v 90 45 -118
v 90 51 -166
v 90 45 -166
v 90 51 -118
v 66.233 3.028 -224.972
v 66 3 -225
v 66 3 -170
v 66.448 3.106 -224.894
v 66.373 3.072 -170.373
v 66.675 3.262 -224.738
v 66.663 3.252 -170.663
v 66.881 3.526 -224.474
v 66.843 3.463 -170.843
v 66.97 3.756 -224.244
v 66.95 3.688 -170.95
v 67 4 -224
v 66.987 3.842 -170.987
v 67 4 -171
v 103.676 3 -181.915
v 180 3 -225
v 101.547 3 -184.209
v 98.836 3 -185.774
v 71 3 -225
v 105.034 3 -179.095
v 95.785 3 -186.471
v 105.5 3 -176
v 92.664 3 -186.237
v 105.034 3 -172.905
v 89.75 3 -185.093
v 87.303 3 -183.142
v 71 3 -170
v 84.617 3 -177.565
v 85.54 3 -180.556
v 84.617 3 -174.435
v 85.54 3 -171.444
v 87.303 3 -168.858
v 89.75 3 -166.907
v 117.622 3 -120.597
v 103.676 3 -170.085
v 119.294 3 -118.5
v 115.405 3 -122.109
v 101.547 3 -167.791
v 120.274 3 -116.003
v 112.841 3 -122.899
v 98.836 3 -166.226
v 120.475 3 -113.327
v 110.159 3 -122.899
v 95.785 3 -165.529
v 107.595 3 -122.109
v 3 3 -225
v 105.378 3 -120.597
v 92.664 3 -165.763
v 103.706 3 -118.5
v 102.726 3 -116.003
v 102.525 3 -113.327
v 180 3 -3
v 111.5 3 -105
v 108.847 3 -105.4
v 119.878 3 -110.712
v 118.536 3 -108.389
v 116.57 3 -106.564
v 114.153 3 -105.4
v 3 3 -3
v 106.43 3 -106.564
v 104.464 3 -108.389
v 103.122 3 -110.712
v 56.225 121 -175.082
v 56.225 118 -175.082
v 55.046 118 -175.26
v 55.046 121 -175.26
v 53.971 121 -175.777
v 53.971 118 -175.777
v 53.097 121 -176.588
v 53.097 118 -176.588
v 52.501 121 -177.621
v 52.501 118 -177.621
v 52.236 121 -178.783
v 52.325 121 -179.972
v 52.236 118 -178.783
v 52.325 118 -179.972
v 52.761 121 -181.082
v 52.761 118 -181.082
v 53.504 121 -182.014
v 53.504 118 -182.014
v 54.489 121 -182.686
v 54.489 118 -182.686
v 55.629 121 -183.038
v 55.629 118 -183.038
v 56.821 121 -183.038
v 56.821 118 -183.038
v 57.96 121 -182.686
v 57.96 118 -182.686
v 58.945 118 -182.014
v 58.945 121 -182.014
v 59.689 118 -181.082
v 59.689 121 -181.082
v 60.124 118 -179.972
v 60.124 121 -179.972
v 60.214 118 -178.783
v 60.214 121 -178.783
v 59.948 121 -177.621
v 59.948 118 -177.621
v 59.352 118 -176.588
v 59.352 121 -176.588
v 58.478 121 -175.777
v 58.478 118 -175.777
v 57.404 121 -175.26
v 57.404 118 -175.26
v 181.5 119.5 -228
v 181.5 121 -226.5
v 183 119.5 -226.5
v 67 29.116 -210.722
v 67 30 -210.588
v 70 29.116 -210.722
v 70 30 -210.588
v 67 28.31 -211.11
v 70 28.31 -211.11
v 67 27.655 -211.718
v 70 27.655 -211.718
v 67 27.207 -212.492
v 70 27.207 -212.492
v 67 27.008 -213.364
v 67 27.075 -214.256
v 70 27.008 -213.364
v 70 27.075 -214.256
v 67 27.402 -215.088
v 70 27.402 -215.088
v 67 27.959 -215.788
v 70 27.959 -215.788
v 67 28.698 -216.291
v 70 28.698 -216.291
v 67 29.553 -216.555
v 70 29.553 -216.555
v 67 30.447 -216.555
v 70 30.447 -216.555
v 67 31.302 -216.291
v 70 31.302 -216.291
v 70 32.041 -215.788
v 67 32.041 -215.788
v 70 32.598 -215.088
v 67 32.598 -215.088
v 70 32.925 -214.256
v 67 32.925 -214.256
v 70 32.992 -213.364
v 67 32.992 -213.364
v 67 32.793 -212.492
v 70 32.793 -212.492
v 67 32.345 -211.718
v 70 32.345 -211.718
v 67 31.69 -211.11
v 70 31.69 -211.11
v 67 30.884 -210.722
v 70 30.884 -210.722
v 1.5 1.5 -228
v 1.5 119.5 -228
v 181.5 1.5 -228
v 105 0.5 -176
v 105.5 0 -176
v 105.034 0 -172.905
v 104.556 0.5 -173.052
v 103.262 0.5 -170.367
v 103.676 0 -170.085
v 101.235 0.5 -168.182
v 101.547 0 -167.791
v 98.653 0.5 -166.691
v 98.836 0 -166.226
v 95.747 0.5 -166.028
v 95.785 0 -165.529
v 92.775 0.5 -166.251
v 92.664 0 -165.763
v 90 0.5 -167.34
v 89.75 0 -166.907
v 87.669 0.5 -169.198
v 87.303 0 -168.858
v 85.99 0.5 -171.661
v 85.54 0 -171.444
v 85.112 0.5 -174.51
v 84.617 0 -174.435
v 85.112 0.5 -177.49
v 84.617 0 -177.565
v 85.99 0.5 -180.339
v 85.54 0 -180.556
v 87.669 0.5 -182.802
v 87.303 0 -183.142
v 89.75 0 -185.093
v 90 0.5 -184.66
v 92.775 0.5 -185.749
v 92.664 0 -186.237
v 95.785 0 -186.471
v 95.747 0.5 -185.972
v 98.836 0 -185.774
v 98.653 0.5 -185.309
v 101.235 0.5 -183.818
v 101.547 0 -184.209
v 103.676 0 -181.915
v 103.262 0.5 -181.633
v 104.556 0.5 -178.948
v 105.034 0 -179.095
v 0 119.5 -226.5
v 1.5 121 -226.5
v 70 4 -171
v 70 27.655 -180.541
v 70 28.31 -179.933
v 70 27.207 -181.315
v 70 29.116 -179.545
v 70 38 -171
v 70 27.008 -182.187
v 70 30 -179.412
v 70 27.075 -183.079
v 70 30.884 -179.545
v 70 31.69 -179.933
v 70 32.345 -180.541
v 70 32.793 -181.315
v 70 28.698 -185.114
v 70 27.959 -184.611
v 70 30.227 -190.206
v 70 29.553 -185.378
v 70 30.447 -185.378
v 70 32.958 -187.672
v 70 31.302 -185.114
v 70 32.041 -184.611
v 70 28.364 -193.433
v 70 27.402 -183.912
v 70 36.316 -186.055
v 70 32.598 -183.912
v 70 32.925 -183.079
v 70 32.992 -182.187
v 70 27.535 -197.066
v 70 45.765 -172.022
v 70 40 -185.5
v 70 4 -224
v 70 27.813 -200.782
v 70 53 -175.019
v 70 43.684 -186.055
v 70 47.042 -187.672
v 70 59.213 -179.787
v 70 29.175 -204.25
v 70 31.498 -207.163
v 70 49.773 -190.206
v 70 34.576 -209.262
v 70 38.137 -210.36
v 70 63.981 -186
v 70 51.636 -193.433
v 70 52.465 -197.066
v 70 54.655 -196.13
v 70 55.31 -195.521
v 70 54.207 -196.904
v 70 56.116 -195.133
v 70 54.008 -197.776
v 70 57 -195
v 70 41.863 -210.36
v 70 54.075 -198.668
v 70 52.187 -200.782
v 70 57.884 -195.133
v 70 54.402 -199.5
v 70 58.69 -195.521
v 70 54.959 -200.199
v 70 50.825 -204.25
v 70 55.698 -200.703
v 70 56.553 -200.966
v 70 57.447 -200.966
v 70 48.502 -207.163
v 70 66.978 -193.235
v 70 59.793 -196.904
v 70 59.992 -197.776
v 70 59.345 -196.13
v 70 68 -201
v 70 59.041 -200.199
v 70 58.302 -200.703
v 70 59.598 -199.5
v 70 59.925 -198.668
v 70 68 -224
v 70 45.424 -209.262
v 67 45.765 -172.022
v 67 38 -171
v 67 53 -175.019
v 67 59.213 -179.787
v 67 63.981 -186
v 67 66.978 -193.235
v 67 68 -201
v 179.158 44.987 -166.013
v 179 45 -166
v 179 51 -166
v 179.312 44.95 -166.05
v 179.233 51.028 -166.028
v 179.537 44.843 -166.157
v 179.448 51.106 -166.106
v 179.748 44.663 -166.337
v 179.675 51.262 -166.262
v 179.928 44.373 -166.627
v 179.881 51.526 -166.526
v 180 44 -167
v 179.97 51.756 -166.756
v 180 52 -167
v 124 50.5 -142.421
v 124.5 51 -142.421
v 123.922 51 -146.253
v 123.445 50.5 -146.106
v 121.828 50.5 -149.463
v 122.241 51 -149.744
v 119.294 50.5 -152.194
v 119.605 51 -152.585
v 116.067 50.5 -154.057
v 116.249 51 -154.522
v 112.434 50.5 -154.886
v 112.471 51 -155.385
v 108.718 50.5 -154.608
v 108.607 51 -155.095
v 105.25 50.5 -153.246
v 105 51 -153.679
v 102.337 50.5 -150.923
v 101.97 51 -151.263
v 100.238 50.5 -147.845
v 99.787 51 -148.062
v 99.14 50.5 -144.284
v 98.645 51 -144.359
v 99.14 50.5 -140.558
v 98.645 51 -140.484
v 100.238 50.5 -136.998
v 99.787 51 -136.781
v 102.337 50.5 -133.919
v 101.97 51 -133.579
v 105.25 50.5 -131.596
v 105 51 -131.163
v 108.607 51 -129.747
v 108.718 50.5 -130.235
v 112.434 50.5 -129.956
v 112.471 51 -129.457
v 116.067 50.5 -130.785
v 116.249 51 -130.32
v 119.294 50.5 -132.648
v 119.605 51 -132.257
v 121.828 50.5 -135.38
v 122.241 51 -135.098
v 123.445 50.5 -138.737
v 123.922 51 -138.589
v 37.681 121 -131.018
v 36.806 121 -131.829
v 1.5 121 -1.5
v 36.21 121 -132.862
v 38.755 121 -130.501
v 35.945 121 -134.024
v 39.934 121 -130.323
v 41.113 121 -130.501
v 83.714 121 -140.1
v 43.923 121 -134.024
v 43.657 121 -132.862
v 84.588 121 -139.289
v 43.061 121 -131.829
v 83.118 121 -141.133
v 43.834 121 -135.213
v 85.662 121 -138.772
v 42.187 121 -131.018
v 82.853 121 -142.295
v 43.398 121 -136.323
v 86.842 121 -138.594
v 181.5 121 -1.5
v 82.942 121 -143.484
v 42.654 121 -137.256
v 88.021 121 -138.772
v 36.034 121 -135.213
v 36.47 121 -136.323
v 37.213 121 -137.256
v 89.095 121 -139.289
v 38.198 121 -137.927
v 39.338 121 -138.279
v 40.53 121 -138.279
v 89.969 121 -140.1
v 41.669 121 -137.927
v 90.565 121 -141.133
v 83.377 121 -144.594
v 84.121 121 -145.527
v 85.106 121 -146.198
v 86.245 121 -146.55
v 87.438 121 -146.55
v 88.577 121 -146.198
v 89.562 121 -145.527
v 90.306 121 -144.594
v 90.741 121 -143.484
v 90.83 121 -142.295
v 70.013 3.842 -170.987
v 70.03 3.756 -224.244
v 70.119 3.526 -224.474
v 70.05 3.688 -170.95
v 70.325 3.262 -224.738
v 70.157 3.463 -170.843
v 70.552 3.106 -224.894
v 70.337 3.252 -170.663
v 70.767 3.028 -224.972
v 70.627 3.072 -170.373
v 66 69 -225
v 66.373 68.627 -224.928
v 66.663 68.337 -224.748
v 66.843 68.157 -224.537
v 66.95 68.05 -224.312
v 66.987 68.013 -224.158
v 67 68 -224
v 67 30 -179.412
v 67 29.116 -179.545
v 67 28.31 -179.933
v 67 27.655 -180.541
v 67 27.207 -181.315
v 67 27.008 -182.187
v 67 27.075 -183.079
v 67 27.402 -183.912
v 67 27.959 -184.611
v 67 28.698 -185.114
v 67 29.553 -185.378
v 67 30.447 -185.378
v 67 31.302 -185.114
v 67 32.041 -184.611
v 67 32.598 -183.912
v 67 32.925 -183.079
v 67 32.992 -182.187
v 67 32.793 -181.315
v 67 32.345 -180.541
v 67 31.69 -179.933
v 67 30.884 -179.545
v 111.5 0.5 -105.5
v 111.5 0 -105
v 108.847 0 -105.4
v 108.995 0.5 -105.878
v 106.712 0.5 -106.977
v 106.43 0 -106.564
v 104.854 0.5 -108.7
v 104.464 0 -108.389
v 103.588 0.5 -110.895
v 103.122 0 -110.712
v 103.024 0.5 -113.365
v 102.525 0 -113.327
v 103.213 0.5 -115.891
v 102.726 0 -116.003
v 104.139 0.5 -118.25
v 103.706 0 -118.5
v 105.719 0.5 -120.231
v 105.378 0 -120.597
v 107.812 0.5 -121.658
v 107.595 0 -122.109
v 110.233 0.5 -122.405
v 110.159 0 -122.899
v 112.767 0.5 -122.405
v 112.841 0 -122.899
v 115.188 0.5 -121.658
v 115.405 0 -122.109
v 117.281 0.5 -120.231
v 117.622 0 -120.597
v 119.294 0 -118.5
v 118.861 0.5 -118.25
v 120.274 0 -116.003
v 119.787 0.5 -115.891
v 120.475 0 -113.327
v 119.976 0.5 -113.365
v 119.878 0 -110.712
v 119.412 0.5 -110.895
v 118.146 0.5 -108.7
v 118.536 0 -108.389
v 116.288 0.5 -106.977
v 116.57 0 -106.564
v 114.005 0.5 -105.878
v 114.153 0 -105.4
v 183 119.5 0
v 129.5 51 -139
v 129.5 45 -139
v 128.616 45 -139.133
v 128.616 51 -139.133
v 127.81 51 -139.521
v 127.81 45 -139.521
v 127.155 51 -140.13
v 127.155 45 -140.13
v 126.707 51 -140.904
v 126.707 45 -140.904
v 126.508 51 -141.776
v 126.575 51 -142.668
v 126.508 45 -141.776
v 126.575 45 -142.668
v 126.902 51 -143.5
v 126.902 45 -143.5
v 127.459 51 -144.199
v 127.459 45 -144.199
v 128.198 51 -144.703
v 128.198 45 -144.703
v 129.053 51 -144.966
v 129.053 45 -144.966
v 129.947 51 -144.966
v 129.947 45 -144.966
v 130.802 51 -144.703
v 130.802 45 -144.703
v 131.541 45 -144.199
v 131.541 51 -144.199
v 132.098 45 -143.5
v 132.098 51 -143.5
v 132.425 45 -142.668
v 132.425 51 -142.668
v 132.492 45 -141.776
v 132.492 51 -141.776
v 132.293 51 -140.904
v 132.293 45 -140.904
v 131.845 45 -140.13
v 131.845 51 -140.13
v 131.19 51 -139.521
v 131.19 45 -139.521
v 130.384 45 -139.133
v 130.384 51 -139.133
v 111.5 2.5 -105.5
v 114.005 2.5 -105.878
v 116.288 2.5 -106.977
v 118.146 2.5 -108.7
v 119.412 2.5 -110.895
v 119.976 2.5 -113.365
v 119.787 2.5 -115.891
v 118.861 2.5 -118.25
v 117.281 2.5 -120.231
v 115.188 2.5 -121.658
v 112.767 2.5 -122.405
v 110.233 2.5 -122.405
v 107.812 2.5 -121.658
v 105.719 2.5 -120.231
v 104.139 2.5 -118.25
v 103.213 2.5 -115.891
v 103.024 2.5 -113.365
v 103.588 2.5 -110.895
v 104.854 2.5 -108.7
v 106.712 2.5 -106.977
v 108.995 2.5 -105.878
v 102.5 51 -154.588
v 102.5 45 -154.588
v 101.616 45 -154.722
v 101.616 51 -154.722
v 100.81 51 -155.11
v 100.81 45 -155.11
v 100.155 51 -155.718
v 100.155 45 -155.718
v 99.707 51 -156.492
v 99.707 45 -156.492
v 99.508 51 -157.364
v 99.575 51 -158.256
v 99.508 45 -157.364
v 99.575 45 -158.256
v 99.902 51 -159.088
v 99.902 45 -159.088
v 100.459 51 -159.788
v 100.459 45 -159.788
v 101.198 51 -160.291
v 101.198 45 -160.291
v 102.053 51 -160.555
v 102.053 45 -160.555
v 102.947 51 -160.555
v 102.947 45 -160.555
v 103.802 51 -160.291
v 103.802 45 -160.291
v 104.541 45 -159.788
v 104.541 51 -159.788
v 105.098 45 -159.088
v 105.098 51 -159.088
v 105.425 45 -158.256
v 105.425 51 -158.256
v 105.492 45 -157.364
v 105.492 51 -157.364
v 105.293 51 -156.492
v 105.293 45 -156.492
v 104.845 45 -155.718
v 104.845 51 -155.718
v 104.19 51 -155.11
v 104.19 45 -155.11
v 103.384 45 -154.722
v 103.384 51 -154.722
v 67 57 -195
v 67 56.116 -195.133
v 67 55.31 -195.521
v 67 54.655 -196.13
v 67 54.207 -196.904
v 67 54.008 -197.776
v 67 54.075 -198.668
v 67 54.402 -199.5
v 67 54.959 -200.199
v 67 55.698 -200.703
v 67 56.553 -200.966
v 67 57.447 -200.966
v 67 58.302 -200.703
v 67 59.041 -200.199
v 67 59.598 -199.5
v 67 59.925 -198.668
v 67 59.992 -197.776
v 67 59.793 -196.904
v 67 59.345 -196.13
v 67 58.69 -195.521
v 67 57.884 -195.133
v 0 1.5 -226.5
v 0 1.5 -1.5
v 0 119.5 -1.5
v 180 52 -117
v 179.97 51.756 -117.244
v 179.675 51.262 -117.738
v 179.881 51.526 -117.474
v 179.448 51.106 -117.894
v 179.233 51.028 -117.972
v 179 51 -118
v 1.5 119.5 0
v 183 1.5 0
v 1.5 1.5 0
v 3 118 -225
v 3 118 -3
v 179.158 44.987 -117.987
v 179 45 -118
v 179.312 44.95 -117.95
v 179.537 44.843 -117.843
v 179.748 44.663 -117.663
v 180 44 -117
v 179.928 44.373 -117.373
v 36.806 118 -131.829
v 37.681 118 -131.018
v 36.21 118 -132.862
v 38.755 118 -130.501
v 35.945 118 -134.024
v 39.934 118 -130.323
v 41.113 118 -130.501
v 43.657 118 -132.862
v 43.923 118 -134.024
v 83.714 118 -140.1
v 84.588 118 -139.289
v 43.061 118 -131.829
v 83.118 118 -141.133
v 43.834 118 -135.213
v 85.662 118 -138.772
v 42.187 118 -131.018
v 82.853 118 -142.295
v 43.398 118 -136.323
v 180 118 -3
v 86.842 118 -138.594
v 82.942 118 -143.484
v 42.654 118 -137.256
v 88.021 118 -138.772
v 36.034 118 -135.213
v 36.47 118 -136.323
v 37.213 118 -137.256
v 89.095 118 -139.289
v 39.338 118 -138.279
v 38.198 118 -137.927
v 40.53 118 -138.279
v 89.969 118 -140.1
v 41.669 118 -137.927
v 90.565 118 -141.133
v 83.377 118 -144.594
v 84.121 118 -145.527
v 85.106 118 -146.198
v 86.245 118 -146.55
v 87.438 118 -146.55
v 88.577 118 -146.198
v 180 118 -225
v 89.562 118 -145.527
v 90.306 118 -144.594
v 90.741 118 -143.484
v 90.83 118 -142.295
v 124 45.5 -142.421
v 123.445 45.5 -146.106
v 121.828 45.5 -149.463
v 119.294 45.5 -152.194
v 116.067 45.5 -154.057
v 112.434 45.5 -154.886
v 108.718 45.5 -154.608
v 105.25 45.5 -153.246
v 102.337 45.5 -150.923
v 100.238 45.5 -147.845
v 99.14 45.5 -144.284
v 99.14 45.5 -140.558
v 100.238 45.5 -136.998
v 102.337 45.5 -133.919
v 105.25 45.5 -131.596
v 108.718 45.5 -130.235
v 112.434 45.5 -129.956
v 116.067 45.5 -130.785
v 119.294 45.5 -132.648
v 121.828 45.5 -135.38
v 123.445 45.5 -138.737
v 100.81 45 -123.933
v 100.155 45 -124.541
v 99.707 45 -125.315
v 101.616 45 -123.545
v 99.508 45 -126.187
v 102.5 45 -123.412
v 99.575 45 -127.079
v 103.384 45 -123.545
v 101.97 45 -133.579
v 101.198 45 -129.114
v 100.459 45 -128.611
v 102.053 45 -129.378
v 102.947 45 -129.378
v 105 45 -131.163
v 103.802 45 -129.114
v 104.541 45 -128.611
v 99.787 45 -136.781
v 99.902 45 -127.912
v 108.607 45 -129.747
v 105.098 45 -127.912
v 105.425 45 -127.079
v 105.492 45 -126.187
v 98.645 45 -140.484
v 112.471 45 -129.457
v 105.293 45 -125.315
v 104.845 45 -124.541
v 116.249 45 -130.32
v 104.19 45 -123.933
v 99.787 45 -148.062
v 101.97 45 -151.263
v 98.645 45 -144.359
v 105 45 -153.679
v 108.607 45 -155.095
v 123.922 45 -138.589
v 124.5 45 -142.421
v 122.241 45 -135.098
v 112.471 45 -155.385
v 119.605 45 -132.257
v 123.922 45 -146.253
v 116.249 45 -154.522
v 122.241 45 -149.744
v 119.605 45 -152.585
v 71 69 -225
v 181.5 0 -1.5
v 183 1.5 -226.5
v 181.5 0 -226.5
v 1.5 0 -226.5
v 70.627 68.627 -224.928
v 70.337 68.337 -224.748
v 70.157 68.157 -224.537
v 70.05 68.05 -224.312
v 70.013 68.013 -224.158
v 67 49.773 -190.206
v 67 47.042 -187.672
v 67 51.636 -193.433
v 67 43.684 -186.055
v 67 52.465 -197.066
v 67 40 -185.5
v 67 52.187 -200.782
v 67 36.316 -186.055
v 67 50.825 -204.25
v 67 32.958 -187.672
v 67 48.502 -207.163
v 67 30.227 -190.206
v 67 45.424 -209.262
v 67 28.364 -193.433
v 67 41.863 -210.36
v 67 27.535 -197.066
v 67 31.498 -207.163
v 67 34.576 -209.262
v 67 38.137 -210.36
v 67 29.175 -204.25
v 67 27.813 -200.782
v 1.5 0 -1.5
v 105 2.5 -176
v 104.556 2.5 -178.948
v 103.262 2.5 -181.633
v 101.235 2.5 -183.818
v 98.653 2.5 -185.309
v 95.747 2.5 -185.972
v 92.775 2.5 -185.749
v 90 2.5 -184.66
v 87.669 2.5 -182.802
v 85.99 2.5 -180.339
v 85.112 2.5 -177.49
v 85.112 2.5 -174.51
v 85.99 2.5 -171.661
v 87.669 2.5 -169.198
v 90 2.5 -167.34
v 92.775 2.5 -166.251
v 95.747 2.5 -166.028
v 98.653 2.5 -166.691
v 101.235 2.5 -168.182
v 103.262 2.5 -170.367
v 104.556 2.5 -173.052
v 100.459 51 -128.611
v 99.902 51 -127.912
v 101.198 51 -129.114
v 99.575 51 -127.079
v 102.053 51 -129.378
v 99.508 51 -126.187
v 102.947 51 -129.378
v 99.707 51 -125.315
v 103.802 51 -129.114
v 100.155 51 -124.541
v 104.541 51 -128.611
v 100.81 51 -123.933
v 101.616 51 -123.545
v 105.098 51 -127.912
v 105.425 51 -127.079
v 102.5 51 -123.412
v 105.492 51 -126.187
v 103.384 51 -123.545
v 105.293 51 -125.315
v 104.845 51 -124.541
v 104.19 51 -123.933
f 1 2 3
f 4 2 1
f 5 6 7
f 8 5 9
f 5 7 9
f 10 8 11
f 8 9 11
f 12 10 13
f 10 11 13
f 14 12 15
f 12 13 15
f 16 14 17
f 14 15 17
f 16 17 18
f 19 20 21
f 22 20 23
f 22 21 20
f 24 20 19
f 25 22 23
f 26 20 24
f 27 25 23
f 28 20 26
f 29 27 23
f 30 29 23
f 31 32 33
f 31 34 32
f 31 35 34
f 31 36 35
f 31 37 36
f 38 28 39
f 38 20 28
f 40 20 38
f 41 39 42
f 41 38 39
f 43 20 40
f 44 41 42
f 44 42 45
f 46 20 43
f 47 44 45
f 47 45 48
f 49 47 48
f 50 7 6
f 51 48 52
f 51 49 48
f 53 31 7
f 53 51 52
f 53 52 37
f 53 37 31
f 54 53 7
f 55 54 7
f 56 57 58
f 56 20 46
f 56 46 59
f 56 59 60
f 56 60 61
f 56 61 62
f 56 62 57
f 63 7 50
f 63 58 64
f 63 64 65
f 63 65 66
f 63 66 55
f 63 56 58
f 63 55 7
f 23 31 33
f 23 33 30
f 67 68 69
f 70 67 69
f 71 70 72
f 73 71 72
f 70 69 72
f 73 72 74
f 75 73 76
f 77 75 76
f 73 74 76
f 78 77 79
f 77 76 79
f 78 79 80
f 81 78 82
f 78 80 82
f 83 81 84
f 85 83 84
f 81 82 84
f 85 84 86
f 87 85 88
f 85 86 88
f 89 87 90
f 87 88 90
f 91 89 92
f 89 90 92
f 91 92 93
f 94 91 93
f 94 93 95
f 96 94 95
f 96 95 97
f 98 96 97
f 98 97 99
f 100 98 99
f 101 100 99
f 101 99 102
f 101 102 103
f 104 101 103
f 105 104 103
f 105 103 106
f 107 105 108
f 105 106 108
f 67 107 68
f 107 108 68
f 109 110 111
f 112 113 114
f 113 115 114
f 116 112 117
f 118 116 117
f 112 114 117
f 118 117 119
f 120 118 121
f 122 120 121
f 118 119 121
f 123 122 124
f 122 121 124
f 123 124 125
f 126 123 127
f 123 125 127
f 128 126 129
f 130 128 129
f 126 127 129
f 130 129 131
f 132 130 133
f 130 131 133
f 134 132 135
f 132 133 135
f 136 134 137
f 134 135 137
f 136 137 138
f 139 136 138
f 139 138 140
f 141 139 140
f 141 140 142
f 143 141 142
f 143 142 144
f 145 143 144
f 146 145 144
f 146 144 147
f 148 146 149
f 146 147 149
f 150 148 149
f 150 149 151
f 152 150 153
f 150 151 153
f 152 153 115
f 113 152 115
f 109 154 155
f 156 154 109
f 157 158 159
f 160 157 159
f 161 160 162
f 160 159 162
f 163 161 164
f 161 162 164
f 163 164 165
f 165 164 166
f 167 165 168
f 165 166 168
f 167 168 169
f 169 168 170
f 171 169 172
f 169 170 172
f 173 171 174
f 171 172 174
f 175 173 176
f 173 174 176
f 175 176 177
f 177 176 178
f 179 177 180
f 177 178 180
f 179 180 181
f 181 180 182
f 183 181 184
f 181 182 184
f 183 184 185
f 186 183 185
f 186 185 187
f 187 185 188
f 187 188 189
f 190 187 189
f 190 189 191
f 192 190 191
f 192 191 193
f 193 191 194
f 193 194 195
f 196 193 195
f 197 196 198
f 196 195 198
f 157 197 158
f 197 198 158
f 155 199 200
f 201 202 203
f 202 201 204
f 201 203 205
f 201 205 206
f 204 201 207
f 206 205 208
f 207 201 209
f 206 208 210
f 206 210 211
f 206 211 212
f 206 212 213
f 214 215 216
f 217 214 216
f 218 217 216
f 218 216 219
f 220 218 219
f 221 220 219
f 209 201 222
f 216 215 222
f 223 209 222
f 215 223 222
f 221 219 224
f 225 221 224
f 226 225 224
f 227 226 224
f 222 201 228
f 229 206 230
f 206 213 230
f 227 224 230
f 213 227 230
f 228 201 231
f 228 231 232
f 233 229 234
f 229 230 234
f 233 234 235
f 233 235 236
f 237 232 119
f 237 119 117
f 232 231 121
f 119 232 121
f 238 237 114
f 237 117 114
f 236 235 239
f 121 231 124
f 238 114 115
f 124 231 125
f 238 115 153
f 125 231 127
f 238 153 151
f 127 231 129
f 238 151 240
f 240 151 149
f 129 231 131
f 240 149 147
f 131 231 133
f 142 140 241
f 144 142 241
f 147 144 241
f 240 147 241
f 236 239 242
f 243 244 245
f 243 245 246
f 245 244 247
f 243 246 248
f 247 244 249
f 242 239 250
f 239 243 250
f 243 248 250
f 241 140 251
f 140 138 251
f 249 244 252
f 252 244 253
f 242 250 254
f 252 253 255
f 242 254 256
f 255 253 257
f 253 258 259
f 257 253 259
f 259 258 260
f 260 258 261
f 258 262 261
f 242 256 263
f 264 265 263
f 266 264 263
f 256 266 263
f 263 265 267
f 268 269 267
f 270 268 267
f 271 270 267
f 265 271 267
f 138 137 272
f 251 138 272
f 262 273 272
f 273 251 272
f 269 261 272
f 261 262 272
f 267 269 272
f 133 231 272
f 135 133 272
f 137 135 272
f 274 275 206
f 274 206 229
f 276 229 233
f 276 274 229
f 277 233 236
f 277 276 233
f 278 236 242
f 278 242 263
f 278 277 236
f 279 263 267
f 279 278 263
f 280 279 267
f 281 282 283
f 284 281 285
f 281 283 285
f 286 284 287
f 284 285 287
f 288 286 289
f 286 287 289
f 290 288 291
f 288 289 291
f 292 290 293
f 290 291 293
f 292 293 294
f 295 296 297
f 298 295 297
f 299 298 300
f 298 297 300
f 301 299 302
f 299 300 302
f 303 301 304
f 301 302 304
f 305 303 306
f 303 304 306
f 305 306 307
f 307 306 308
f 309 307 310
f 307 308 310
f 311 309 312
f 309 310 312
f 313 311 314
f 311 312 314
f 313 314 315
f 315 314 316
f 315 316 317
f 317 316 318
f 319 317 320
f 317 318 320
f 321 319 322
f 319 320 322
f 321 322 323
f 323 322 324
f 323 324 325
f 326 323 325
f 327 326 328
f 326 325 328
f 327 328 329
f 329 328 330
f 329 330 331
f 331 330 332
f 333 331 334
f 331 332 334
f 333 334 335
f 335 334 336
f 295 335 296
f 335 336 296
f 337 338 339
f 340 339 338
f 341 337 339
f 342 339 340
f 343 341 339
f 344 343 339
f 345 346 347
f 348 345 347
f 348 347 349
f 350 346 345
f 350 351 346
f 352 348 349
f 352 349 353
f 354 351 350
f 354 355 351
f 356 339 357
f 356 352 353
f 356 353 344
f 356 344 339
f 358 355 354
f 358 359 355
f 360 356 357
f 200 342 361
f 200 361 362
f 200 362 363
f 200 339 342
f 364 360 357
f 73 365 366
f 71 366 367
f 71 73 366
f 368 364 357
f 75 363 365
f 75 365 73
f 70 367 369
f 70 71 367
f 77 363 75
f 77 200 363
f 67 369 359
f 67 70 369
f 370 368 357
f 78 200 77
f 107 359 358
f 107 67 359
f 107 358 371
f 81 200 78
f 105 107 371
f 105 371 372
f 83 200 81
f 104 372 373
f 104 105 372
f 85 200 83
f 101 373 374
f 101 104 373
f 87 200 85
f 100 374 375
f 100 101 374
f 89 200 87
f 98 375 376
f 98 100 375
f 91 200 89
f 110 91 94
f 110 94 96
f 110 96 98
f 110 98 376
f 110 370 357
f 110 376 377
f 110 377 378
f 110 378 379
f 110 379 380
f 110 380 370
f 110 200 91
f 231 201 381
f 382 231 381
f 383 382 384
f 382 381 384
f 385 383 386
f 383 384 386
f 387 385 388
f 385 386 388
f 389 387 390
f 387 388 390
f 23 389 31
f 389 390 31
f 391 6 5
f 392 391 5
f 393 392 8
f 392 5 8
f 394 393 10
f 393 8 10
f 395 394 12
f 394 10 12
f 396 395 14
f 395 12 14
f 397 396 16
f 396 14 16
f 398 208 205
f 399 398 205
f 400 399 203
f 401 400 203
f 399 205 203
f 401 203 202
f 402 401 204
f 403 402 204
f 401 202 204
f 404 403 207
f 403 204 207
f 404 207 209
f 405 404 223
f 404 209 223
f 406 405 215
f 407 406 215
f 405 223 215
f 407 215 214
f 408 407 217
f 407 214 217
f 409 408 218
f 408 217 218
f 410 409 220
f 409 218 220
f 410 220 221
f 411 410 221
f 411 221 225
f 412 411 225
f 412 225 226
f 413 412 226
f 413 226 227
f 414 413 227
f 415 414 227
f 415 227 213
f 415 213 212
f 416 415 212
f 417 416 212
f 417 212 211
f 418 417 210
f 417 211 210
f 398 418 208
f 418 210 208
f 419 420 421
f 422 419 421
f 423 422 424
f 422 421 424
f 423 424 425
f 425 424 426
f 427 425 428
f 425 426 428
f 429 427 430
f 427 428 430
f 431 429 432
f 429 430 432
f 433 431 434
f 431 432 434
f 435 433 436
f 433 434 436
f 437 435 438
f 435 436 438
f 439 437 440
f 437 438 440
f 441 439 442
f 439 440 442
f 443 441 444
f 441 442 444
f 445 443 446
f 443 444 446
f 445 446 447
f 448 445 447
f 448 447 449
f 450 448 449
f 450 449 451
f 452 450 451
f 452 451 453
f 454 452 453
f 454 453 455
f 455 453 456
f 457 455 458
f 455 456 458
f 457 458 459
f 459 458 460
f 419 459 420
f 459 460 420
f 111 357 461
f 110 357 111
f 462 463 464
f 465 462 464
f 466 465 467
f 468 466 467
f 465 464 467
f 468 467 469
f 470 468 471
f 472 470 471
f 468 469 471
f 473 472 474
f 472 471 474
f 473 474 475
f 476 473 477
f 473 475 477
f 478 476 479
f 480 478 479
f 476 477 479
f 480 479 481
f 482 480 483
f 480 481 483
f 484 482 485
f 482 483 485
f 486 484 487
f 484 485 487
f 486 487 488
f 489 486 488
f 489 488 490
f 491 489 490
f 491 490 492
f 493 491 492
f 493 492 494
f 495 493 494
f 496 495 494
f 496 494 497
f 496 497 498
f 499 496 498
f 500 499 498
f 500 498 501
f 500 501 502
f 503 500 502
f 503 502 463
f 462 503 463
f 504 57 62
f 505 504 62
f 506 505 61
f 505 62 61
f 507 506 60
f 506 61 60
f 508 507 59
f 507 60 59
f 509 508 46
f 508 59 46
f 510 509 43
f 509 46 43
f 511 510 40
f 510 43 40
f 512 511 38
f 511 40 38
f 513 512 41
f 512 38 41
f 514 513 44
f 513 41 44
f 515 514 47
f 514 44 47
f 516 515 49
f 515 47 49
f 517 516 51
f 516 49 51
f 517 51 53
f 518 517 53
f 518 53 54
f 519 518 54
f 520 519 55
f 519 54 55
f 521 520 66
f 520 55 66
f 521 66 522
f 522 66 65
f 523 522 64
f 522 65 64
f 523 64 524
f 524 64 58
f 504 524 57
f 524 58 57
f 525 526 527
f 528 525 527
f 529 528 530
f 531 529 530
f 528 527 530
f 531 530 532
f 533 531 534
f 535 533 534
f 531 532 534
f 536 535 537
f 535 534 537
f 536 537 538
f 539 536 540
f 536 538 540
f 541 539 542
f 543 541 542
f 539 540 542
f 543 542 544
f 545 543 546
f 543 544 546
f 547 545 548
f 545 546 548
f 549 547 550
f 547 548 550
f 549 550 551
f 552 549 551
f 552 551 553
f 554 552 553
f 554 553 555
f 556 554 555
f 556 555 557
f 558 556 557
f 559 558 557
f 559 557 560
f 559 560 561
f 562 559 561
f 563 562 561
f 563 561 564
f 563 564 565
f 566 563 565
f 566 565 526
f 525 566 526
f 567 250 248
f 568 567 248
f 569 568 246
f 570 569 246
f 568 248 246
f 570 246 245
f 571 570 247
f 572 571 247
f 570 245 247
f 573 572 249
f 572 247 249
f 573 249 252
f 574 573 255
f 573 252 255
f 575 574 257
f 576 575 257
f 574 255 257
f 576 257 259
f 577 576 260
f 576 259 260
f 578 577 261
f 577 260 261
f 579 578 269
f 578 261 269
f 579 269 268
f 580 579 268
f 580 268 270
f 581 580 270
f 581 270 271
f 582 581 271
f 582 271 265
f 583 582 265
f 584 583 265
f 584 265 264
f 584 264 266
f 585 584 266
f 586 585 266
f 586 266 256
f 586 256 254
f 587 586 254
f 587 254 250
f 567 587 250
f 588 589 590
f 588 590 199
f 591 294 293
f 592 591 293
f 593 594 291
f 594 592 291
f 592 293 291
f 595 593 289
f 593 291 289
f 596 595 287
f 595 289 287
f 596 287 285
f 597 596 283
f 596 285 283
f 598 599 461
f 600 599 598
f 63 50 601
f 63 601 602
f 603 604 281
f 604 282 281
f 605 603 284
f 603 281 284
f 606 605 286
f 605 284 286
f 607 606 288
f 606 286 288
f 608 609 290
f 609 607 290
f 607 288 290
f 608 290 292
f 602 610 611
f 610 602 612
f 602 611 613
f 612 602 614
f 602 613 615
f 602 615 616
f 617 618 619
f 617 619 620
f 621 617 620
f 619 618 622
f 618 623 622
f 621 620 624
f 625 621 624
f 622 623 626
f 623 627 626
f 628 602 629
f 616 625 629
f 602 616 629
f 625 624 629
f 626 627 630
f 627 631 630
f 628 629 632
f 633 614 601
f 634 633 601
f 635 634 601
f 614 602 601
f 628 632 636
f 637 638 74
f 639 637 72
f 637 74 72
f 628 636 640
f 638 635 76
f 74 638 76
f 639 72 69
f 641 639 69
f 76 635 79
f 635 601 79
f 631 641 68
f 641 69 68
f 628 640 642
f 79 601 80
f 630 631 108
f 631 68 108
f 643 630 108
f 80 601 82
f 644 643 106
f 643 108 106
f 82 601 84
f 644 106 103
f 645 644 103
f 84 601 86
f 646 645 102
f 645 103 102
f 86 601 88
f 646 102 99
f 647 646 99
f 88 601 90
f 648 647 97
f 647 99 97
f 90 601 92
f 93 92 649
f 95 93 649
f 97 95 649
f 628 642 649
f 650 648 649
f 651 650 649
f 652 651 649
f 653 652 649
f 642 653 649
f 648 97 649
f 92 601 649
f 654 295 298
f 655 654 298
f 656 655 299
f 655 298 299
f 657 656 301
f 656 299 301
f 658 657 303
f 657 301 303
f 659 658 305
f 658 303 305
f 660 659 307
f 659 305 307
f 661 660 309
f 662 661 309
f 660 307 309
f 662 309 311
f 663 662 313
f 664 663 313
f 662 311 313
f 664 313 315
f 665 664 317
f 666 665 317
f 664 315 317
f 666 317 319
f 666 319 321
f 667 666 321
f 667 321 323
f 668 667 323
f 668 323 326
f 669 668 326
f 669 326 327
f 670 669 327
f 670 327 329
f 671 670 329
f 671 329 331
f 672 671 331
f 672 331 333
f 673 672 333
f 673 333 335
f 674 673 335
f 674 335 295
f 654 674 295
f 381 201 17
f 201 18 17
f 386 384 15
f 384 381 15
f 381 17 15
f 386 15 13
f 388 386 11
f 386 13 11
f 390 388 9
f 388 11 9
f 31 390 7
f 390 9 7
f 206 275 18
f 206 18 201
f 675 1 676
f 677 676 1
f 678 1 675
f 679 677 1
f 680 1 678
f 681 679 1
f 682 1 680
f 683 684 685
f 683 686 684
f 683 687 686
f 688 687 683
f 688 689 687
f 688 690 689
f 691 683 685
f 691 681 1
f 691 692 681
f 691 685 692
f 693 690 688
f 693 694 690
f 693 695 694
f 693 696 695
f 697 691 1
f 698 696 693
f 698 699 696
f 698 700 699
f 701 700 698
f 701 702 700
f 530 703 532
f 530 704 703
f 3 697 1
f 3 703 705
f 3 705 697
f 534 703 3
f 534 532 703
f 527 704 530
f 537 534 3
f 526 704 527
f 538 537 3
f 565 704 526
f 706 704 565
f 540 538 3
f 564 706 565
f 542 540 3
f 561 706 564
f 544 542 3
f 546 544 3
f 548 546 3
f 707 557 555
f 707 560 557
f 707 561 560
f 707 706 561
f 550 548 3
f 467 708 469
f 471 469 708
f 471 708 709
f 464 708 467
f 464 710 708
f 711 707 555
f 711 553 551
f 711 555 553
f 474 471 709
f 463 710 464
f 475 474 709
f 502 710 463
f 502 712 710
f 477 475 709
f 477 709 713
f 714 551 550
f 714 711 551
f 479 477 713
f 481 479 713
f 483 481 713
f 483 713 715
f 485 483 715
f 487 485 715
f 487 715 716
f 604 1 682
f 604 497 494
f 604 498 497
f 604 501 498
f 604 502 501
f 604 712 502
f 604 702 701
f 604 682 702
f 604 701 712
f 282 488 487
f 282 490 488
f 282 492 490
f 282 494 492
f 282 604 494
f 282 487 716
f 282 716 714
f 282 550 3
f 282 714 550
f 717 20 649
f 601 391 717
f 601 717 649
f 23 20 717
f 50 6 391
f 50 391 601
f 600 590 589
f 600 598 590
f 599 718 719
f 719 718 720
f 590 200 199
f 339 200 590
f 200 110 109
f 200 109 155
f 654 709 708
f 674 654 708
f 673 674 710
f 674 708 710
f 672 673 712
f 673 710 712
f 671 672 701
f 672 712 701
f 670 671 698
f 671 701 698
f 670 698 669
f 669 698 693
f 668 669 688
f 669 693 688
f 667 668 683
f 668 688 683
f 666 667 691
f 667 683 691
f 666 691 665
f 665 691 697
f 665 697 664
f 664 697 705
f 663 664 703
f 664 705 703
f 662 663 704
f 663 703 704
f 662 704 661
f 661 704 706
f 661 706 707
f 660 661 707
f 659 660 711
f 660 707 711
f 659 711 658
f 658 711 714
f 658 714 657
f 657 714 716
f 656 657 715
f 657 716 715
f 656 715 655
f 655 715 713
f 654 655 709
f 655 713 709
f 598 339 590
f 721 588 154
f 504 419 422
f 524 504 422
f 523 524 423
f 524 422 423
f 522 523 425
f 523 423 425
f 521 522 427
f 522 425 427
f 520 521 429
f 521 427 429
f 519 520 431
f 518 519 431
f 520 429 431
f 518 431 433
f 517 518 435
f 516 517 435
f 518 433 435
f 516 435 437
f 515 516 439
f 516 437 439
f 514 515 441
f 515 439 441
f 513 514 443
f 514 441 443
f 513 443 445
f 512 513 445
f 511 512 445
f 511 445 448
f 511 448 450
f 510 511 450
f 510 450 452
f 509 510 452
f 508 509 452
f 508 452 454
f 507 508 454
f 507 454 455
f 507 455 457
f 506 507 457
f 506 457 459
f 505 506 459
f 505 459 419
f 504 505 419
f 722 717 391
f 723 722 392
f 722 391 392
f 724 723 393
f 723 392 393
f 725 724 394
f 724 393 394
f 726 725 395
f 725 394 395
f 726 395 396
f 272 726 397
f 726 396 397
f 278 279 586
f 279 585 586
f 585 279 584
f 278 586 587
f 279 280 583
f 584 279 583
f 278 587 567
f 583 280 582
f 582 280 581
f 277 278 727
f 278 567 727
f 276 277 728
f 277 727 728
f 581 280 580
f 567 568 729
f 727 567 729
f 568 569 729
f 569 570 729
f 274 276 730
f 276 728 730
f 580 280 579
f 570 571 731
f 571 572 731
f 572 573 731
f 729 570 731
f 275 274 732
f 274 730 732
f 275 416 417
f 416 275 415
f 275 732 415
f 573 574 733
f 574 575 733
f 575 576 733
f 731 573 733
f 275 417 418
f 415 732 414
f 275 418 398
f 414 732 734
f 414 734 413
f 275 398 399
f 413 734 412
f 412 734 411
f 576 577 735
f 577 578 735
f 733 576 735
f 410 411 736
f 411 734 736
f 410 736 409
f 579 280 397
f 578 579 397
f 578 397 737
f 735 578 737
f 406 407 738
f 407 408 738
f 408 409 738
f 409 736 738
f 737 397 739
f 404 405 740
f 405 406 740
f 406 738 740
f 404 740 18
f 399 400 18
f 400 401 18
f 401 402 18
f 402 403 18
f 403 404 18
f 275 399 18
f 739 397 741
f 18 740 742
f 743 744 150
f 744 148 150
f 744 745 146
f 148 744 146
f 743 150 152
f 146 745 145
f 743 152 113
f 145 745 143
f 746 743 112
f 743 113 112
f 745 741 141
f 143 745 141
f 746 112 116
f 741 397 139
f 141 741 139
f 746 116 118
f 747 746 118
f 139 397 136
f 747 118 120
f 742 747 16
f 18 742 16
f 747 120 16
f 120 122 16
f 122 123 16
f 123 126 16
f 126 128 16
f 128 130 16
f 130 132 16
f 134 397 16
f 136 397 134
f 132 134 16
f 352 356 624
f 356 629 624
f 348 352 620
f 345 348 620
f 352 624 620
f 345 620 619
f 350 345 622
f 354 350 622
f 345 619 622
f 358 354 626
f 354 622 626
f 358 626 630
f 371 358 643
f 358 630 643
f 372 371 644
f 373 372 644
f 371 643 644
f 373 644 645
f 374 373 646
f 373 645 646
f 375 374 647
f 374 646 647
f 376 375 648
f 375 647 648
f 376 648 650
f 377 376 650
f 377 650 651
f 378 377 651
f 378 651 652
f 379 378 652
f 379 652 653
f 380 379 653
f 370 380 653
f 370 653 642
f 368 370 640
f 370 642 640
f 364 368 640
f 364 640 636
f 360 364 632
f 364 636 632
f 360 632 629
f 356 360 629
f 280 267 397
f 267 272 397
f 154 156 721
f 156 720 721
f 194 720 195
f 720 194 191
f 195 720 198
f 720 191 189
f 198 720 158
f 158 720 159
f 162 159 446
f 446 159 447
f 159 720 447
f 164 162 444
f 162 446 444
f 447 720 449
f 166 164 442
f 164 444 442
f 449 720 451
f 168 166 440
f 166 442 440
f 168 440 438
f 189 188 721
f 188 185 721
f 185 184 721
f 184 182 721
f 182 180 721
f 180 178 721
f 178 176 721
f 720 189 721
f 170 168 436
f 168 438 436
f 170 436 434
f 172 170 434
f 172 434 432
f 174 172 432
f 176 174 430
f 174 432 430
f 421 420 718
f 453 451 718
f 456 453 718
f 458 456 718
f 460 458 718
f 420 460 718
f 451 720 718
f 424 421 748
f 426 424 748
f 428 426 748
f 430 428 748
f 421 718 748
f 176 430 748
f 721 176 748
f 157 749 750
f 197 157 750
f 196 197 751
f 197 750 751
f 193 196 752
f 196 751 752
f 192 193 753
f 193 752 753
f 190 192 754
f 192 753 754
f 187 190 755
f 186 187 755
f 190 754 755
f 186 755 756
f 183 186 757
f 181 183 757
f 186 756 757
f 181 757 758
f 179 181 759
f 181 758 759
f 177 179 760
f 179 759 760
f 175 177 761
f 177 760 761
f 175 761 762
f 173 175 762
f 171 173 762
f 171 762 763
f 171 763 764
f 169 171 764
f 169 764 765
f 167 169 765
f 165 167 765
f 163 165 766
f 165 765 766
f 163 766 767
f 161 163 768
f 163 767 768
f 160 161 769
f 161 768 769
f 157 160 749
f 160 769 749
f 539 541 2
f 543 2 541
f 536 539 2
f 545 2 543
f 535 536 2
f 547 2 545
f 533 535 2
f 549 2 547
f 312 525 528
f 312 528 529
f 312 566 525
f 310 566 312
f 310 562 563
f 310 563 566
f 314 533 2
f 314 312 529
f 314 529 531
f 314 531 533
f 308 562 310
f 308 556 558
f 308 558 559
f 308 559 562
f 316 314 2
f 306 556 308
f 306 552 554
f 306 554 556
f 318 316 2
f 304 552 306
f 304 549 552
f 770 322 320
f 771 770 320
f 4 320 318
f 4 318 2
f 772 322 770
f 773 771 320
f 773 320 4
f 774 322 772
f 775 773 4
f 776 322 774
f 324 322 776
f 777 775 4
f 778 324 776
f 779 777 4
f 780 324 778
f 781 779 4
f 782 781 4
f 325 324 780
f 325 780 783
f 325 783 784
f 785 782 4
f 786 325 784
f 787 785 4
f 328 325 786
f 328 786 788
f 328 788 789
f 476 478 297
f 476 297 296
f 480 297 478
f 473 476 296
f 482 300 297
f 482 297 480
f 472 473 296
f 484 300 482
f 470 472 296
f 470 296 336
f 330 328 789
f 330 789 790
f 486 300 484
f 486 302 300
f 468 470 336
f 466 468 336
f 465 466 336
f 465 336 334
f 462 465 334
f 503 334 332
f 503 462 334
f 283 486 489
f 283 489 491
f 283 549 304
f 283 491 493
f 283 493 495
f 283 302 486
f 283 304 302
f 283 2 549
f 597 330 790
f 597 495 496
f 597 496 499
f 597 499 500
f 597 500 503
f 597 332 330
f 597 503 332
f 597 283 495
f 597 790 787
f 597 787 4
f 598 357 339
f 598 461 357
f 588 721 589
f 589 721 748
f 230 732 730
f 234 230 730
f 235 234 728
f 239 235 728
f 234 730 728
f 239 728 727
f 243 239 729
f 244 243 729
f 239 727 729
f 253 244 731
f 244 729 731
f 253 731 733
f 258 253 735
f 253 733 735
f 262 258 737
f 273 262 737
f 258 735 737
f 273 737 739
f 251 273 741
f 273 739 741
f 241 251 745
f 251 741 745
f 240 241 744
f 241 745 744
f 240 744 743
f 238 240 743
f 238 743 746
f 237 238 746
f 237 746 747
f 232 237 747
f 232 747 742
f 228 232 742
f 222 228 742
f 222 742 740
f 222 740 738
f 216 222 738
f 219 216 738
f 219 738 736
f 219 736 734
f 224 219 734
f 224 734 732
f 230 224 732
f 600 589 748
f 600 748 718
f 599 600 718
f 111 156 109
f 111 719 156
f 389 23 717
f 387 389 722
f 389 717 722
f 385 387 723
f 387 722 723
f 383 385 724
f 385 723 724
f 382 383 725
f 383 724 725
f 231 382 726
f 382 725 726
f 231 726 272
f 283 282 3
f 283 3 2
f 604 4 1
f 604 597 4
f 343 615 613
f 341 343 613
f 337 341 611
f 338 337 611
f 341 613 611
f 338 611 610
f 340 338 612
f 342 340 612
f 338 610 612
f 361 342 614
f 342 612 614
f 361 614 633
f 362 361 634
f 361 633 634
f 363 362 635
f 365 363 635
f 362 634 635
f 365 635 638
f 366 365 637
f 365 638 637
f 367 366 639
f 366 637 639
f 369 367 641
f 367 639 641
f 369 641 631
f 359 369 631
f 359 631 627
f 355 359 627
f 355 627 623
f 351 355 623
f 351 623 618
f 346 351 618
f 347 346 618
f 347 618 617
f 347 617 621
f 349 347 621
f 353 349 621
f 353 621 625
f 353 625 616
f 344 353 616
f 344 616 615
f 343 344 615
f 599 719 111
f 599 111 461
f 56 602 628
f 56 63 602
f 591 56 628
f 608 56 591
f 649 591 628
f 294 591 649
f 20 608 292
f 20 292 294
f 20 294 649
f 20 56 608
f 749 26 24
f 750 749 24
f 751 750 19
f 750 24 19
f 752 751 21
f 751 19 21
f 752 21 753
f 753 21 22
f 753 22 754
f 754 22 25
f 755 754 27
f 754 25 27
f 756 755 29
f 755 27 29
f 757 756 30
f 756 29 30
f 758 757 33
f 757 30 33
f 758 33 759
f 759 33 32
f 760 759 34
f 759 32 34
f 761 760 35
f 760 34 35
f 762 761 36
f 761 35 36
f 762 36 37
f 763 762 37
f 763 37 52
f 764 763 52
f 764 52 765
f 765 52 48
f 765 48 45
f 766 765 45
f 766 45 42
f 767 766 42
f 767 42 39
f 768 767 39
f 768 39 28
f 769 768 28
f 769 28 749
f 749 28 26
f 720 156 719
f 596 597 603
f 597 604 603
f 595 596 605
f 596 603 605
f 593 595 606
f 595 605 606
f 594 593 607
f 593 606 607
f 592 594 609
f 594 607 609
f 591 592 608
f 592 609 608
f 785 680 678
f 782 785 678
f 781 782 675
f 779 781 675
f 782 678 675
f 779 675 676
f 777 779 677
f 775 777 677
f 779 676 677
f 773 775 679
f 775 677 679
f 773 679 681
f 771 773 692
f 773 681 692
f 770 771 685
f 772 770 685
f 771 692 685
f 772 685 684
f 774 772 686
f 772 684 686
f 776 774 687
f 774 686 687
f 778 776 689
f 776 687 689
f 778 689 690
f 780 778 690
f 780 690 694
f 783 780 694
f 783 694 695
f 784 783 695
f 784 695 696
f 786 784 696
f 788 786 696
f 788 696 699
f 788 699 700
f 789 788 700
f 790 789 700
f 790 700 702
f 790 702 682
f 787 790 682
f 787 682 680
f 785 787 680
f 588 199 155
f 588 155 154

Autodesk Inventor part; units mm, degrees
ref_plane "YZ Plane" through (0, 0, 0) normal (1, 0, 0) x (0, 1, 0)
ref_plane "XZ Plane" through (0, 0, 0) normal (0, 1, 0) x (-1, 0, 0)
ref_plane "XY Plane" through (0, 0, 0) normal (0, 0, 1) x (1, 0, 0)
sketch "Sketch1" plane through (0, 0, 0) normal (0, 1, 0) x (-1, 0, 0)
  line L0 (0, -228) -> (-183, -228)
  line L1 (-183, -228) -> (-183, 0)
  line L2 (-183, 0) -> (0, 0)
  line L3 (0, 0) -> (0, -228)
  dimension "d26" = 228
  dimension "d27" = 183
extrude "base" add sketch "Sketch1" along normal blind 3
sketch "Sketch5" plane through (0, 3, 0) normal (0, 1, 0) x (1, 0, 0)
  line L0 (0, 228) -> (0, 0) projected
  line L1 (0, 0) -> (183, 0) projected
  line L2 (183, 0) -> (183, 228) projected
  line L3 (183, 228) -> (0, 228) projected
  point P0 (111.5, 114)
  dimension "d46" = 114
  dimension "d47" = 111.5
  dimension "d48" = 183
  dimension "d49" = 228
hole "centreHole" at (111.5, 3, -114) direction (0, -1, 0) diameter 17 end through all
chamfer "holeChamfer" distance 0.5 angle 45 2 edges at (111.5, 0, -122.5) (111.5, 3, -122.5)
sketch "Sketch7" plane through (0, 3, 0) normal (0, 1, 0) x (1, 0, 0)
  line L0 (183, 228) -> (0, 228) projected
  line L1 (0, 0) -> (183, 0) projected
  line L2 (183, 0) -> (183, 228) projected
  line L3 (183, 228) -> (0, 228) projected
  line L4 (0, 228) -> (0, 0) projected
  line L5 (3, 3) -> (180, 3)
  line L6 (180, 3) -> (180, 225)
  line L7 (180, 225) -> (3, 225)
  line L8 (3, 225) -> (3, 3)
  dimension "d29" = 3
extrude "walls" add sketch "Sketch7" along normal blind 115
sketch "Sketch10" plane through (180, 3, -225) normal (-1, 0, 0) x (0, 0, 1)
  line L0 (59, 48) -> (107, 48)
  line L1 (107, 48) -> (107, 42)
  line L2 (107, 42) -> (59, 42)
  line L3 (59, 42) -> (59, 48)
  line L4 (222, 0) -> (222, 115) projected
  line L5 (222, 0) -> (0, 0) projected
  line L6 (83, 48) -> (83, 42)
  point P0 (225, -3)
  dimension "d60" = 6
  dimension "d61" = 48
  dimension "d91" = 139
  dimension "d92" = 222
  dimension "d118" = 48
extrude "platform" add sketch "Sketch10" along normal blind 90
sketch "Sketch11" plane through (180, 51, -118) normal (0, 1, 0) x (1, 0, 0)
  circle A0 centre (-68.5, 24) radius 18
  line L0 (-68.5, 24) -> (-50.5, 24)
  line L1 (-68.5, 24) -> (-77.5, 8.4115)
  line L2 (-68.5, 24) -> (-77.5, 39.5885)
  line L3 (0, 0) -> (-90, 0) projected
  line L4 (0, 48) -> (-90, 48) projected
  circle A1 centre (-68.5, -4) radius 9 projected
  line L5 (-68.5, -4) -> (-68.5, 60.8189)
  point P0 (-180, -118)
  dimension "d68" = 36
  dimension "d69" = 120
  dimension "d70" = 120
  dimension "d74" = 48
  dimension "d82" = 28
hole "motorScrewHoles" at (102.5, 51, -157.5885) at (129.5, 51, -142) at (102.5, 51, -126.4115) direction (0, -1, 0) diameter 6 depth 6
sketch "Sketch12" plane through (180, 51, -118) normal (0, 1, 0) x (1, 0, 0)
  circle A0 centre (-68.5, -4) radius 9 projected
  line L0 (-68.5, -4) -> (-68.5, 71.2028)
  circle A1 centre (-68.5, 24.4211) radius 12.5
  point P0 (-180, -118)
  dimension "d83" = 25
extrude "motorShaftHole" cut sketch "Sketch12" against normal up to surface (6 mm away) contours A1 L0 | L0 A1
chamfer "Chamfer2" distance 0.5 angle 45 2 edges at (99, 45, -142.4211) (99, 51, -142.4211)
sketch "Sketch13" plane through (3, 3, -225) normal (0, 0, 1) x (1, 0, 0)
  line L0 (177, 0) -> (0, 0) projected
  line L1 (64, 0) -> (67, 0)
  line L2 (67, 0) -> (67, 65)
  line L3 (67, 65) -> (64, 65)
  line L4 (64, 65) -> (64, 0)
  line L5 (87, 42) -> (87, 48) projected
  point P0 (-3, -3)
  dimension "d93" = 3
  dimension "d94" = 65
  dimension "d95" = 20
extrude "Extrusion8" add sketch "Sketch13" along normal blind 54
sketch "Sketch14" plane through (67, 3, -225) normal (-1, 0, 0) x (0, 0, 1)
  circle A0 centre (27, 36) radius 18
  line L0 (27, 36) -> (11.4115, 27)
  line L1 (27, 36) -> (27, 54)
  line L2 (27, 36) -> (42.5885, 27)
  line L3 (54, 0) -> (0, 0) projected
  line L4 (54, 65) -> (54, 0) projected
  line L5 (0, 0) -> (0, 115) projected
  point P0 (225, -3)
  dimension "d98" = 36
  dimension "d99" = 120
  dimension "d100" = 120
  dimension "d101" = 36
  dimension "d114" = 27
hole "Hole4" at (67, 30, -213.5885) at (67, 57, -198) at (67, 30, -182.4115) direction (1, 0, 0) diameter 6 depth 3
fillet "Fillet2" radius 1 10 edges at (180, 51, -142) (180, 45, -142) (180, 48, -118) (180, 48, -166) (68.5, 68, -225) (67, 35.5, -225) (70, 35.5, -225) (70, 3, -198) (67, 3, -198) (68.5, 3, -171)
sketch "Sketch15" plane through (67, 4, -171) normal (-1, 0, 0) x (0, 0, 1)
  circle A0 centre (-27, 36) radius 12.5
  line L0 (0, 0) -> (-53, 0) projected
  line L1 (-54, 65) -> (-54, -1) projected
  point P0 (171, -4)
  dimension "d111" = 25
  dimension "d115" = 36
  dimension "d116" = 27
extrude "Extrusion9" cut sketch "Sketch15" against normal up to surface (3 mm away)
fillet "Fillet3" radius 30 1 edges at (68.5, 68, -171)
sketch "Sketch16" plane through (0, 3, 0) normal (0, 1, 0) x (1, 0, 0)
  circle A0 centre (95, 176) radius 10
  line L0 (67, 171) -> (70, 171) projected
  line L1 (70, 201) -> (70, 171) projected
  point P0 (0, 0)
  dimension "d119" = 20
  dimension "d121" = 25
  dimension "d127" = 5
extrude "Extrusion10" cut sketch "Sketch16" against normal blind 50
chamfer "Chamfer3" distance 0.5 angle 45 2 edges at (85, 3, -176) (85, 0, -176)
sketch "Sketch17" plane through (0, 118, 0) normal (0, 1, 0) x (1, 0, 0)
  line L0 (0, 228) -> (183, 228)
  line L1 (183, 228) -> (183, 0)
  line L2 (183, 0) -> (0, 0)
  line L3 (0, 0) -> (0, 228)
  point P0 (0, 0)
extrude "Extrusion11" add sketch "Sketch17" along normal blind 3
chamfer "Chamfer4" distance 1.5 angle 45 11 edges at (0, 60.5, -228) (0, 121, -114) (91.5, 121, -228) (183, 121, -114) (183, 60.5, -228) (91.5, 121, 0) (0, 60.5, 0) (0, 0, -114) (91.5, 0, -228) (91.5, 0, 0) (183, 0, -114)
sketch "Sketch18" plane through (0, 121, 0) normal (0, 1, 0) x (1, 0, 0)
  circle A0 centre (61, 152) radius 27.5
  line L0 (183, 0) -> (183, 226.5) projected
  line L1 (0, 226.5) -> (0, 1.5) projected
  line L2 (181.5, 228) -> (1.5, 228) projected
  line L3 (1.5, 0) -> (183, 0) projected
  line L4 (61, 152) -> (86.8415, 142.5944)
  line L5 (61, 152) -> (39.9338, 134.3233)
  line L6 (61, 152) -> (56.2247, 179.0822)
  line L7 (61, 152) -> (33.5, 152)
  point P0 (0, 0)
  dimension "d133" = 55
  dimension "d134" = 183
  dimension "d135" = 61
  dimension "d136" = 228
  dimension "d137" = 76
  dimension "d138" = 120
  dimension "d147" = 120
  dimension "d149" = 80
hole "Hole5" at (56.2247, 121, -179.0822) at (86.8415, 121, -142.5944) at (39.9338, 121, -134.3233) direction (0, -1, 0) diameter 8 depth 3
equation "\"d0\" = t"
equation "\"d46\" = 0.5 * d49"
equation "\"d47\" = 0.5 * d48 + offset"
equation "\"d29\" = t"
equation "\"d91\" = 0.5 * d92 + pd"
equation "\"d68\" = d72"
equation "\"d82\" = pd"
equation "\"d93\" = t"
equation "\"d128\" = t"
equation "\"d135\" = 0.333333 * d134"
equation "\"d137\" = 0.333333 * d136"
equation "\"t\" = 3"
equation "\"pd\" = 28"
equation "\"dmotorpattern\" = 36"
equation "\"d72\" = 36"
equation "\"d73\" = 28"
equation "\"offset\" = 20"
properties part number "box" material "Aluminum 6061"
